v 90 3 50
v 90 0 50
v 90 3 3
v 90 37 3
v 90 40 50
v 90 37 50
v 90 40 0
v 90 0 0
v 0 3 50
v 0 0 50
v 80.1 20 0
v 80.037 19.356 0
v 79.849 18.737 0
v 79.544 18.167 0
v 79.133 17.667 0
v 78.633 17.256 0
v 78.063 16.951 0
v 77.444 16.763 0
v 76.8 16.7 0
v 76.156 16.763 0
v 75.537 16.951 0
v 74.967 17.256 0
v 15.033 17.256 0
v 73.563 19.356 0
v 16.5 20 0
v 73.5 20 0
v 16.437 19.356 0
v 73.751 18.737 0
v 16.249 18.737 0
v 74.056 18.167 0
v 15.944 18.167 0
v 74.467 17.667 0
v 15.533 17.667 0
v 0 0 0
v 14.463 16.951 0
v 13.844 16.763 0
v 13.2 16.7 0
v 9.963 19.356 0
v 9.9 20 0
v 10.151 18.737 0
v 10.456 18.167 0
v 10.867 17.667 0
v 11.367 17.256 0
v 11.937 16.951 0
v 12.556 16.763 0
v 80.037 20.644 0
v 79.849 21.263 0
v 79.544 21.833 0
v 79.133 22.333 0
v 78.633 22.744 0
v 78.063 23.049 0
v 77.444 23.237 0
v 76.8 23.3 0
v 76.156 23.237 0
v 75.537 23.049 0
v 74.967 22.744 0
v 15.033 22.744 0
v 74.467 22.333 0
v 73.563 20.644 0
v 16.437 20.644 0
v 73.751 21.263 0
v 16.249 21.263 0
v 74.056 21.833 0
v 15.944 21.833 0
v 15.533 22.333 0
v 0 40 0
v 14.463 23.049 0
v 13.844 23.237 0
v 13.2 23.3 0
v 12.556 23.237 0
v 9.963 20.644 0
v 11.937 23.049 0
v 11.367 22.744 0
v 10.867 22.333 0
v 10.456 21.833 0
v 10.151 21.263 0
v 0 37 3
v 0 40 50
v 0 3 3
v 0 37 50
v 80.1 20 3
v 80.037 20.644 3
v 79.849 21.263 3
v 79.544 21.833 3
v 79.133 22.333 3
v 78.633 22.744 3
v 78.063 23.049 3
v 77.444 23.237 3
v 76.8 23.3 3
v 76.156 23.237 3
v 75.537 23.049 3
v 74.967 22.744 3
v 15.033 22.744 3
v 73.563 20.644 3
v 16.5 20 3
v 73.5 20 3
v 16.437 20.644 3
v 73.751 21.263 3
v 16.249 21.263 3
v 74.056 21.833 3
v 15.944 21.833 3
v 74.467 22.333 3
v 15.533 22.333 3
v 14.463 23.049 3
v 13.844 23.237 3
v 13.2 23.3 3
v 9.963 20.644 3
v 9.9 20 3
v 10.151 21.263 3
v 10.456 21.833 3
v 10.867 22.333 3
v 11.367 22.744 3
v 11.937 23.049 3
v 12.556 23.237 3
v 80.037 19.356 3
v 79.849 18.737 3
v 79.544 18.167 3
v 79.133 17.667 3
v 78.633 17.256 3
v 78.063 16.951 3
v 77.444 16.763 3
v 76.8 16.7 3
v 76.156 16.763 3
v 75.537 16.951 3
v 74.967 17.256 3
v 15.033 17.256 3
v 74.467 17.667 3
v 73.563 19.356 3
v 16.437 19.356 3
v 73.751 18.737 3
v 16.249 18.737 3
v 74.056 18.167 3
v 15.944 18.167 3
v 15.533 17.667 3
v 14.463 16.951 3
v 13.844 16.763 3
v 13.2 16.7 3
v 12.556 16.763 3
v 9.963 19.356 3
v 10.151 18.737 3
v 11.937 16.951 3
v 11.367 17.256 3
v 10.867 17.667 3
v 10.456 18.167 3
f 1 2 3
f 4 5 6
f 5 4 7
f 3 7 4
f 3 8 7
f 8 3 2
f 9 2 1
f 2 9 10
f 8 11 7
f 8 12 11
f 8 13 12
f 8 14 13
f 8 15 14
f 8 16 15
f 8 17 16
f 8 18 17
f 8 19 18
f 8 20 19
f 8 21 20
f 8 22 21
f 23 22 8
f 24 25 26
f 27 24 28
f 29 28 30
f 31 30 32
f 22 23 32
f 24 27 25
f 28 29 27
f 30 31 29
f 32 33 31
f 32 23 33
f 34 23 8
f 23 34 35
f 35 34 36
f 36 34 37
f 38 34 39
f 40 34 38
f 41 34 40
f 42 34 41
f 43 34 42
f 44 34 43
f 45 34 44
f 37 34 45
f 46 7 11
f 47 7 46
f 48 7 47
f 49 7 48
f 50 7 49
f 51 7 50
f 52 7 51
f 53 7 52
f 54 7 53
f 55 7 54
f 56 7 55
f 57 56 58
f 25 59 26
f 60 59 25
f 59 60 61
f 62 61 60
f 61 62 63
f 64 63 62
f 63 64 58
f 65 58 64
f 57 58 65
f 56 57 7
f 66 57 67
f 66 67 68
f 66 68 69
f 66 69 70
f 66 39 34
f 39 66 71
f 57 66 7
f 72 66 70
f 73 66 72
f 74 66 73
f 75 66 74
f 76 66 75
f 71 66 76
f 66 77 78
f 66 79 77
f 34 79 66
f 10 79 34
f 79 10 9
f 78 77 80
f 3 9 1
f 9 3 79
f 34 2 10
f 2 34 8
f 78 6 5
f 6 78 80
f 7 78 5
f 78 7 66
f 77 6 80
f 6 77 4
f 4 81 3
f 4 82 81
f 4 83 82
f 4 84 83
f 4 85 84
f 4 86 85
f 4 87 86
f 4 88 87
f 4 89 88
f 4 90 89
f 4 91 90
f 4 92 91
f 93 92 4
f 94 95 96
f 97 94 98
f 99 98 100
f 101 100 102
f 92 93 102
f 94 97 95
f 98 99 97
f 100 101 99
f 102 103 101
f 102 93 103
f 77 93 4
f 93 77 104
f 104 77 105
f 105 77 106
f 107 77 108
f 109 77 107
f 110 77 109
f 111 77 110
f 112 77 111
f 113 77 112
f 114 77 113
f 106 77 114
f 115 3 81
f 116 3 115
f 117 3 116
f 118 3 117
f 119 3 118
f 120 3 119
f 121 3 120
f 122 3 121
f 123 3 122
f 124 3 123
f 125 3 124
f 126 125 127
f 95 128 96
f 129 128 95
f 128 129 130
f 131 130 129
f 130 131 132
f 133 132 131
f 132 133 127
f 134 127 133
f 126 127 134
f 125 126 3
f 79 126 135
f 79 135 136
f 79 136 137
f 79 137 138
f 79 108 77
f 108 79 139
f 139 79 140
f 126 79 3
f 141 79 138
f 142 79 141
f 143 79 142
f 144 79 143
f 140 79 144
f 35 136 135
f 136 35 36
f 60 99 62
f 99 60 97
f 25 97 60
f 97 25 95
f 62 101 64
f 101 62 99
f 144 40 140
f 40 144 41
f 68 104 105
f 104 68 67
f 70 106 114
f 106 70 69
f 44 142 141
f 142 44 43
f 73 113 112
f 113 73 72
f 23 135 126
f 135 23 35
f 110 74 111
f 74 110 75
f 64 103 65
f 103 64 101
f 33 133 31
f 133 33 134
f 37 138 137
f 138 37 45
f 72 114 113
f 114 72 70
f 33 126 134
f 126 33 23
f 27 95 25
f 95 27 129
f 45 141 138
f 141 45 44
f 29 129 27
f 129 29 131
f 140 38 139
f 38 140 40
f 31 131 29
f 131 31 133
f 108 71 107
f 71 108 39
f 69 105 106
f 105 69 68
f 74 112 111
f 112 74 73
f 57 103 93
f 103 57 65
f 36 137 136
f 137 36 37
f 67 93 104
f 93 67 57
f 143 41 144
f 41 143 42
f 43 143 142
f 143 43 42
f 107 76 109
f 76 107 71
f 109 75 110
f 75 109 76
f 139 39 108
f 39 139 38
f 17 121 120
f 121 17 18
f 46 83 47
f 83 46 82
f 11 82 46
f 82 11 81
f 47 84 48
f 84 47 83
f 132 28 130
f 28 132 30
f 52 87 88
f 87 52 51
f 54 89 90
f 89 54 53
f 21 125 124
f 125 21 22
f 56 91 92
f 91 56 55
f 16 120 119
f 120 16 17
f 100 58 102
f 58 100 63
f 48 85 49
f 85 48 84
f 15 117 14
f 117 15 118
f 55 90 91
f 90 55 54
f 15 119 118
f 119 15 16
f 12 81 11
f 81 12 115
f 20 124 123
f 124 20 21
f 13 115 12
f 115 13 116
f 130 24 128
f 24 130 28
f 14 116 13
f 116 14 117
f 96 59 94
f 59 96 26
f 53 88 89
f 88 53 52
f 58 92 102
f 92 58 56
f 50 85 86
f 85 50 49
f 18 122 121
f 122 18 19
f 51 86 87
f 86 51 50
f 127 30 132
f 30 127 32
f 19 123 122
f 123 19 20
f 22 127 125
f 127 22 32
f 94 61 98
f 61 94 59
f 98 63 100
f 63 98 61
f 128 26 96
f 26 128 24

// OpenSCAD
$fn = 32;

// ----------------------------------------------------------------------
// U-bracket: 90 x 40 x 50 mm
// ----------------------------------------------------------------------

// --- parameters (mm) ---
base_len = 90;            // outer length, X
channel_w = 40;           // outer width, Y
upright_h = 50;           // upright height, Z
mat_t = 3;                // wall thickness
hole_d = 6.6;             // clearance for M6

module hole_z(px, py) {
  translate([px, py, -2.5]) cylinder(h = mat_t + 5, d = hole_d);
}
module hole_y_pz(pz) {
  /* through both uprights along Y */
  translate([0, -2.5, pz]) rotate([-90, 0, 0]) cylinder(h = channel_w + 5, d = hole_d);
}

module base() {
  cube([base_len, channel_w, mat_t]);
}

module uprights() {
  cube([base_len, mat_t, upright_h]);
  translate([0, channel_w - mat_t, 0]) cube([base_len, mat_t, upright_h]);
}

difference() {
  union() {
    base();
    uprights();
  }
  hole_z(13.2, 20);
  hole_z(76.8, 20);
}
